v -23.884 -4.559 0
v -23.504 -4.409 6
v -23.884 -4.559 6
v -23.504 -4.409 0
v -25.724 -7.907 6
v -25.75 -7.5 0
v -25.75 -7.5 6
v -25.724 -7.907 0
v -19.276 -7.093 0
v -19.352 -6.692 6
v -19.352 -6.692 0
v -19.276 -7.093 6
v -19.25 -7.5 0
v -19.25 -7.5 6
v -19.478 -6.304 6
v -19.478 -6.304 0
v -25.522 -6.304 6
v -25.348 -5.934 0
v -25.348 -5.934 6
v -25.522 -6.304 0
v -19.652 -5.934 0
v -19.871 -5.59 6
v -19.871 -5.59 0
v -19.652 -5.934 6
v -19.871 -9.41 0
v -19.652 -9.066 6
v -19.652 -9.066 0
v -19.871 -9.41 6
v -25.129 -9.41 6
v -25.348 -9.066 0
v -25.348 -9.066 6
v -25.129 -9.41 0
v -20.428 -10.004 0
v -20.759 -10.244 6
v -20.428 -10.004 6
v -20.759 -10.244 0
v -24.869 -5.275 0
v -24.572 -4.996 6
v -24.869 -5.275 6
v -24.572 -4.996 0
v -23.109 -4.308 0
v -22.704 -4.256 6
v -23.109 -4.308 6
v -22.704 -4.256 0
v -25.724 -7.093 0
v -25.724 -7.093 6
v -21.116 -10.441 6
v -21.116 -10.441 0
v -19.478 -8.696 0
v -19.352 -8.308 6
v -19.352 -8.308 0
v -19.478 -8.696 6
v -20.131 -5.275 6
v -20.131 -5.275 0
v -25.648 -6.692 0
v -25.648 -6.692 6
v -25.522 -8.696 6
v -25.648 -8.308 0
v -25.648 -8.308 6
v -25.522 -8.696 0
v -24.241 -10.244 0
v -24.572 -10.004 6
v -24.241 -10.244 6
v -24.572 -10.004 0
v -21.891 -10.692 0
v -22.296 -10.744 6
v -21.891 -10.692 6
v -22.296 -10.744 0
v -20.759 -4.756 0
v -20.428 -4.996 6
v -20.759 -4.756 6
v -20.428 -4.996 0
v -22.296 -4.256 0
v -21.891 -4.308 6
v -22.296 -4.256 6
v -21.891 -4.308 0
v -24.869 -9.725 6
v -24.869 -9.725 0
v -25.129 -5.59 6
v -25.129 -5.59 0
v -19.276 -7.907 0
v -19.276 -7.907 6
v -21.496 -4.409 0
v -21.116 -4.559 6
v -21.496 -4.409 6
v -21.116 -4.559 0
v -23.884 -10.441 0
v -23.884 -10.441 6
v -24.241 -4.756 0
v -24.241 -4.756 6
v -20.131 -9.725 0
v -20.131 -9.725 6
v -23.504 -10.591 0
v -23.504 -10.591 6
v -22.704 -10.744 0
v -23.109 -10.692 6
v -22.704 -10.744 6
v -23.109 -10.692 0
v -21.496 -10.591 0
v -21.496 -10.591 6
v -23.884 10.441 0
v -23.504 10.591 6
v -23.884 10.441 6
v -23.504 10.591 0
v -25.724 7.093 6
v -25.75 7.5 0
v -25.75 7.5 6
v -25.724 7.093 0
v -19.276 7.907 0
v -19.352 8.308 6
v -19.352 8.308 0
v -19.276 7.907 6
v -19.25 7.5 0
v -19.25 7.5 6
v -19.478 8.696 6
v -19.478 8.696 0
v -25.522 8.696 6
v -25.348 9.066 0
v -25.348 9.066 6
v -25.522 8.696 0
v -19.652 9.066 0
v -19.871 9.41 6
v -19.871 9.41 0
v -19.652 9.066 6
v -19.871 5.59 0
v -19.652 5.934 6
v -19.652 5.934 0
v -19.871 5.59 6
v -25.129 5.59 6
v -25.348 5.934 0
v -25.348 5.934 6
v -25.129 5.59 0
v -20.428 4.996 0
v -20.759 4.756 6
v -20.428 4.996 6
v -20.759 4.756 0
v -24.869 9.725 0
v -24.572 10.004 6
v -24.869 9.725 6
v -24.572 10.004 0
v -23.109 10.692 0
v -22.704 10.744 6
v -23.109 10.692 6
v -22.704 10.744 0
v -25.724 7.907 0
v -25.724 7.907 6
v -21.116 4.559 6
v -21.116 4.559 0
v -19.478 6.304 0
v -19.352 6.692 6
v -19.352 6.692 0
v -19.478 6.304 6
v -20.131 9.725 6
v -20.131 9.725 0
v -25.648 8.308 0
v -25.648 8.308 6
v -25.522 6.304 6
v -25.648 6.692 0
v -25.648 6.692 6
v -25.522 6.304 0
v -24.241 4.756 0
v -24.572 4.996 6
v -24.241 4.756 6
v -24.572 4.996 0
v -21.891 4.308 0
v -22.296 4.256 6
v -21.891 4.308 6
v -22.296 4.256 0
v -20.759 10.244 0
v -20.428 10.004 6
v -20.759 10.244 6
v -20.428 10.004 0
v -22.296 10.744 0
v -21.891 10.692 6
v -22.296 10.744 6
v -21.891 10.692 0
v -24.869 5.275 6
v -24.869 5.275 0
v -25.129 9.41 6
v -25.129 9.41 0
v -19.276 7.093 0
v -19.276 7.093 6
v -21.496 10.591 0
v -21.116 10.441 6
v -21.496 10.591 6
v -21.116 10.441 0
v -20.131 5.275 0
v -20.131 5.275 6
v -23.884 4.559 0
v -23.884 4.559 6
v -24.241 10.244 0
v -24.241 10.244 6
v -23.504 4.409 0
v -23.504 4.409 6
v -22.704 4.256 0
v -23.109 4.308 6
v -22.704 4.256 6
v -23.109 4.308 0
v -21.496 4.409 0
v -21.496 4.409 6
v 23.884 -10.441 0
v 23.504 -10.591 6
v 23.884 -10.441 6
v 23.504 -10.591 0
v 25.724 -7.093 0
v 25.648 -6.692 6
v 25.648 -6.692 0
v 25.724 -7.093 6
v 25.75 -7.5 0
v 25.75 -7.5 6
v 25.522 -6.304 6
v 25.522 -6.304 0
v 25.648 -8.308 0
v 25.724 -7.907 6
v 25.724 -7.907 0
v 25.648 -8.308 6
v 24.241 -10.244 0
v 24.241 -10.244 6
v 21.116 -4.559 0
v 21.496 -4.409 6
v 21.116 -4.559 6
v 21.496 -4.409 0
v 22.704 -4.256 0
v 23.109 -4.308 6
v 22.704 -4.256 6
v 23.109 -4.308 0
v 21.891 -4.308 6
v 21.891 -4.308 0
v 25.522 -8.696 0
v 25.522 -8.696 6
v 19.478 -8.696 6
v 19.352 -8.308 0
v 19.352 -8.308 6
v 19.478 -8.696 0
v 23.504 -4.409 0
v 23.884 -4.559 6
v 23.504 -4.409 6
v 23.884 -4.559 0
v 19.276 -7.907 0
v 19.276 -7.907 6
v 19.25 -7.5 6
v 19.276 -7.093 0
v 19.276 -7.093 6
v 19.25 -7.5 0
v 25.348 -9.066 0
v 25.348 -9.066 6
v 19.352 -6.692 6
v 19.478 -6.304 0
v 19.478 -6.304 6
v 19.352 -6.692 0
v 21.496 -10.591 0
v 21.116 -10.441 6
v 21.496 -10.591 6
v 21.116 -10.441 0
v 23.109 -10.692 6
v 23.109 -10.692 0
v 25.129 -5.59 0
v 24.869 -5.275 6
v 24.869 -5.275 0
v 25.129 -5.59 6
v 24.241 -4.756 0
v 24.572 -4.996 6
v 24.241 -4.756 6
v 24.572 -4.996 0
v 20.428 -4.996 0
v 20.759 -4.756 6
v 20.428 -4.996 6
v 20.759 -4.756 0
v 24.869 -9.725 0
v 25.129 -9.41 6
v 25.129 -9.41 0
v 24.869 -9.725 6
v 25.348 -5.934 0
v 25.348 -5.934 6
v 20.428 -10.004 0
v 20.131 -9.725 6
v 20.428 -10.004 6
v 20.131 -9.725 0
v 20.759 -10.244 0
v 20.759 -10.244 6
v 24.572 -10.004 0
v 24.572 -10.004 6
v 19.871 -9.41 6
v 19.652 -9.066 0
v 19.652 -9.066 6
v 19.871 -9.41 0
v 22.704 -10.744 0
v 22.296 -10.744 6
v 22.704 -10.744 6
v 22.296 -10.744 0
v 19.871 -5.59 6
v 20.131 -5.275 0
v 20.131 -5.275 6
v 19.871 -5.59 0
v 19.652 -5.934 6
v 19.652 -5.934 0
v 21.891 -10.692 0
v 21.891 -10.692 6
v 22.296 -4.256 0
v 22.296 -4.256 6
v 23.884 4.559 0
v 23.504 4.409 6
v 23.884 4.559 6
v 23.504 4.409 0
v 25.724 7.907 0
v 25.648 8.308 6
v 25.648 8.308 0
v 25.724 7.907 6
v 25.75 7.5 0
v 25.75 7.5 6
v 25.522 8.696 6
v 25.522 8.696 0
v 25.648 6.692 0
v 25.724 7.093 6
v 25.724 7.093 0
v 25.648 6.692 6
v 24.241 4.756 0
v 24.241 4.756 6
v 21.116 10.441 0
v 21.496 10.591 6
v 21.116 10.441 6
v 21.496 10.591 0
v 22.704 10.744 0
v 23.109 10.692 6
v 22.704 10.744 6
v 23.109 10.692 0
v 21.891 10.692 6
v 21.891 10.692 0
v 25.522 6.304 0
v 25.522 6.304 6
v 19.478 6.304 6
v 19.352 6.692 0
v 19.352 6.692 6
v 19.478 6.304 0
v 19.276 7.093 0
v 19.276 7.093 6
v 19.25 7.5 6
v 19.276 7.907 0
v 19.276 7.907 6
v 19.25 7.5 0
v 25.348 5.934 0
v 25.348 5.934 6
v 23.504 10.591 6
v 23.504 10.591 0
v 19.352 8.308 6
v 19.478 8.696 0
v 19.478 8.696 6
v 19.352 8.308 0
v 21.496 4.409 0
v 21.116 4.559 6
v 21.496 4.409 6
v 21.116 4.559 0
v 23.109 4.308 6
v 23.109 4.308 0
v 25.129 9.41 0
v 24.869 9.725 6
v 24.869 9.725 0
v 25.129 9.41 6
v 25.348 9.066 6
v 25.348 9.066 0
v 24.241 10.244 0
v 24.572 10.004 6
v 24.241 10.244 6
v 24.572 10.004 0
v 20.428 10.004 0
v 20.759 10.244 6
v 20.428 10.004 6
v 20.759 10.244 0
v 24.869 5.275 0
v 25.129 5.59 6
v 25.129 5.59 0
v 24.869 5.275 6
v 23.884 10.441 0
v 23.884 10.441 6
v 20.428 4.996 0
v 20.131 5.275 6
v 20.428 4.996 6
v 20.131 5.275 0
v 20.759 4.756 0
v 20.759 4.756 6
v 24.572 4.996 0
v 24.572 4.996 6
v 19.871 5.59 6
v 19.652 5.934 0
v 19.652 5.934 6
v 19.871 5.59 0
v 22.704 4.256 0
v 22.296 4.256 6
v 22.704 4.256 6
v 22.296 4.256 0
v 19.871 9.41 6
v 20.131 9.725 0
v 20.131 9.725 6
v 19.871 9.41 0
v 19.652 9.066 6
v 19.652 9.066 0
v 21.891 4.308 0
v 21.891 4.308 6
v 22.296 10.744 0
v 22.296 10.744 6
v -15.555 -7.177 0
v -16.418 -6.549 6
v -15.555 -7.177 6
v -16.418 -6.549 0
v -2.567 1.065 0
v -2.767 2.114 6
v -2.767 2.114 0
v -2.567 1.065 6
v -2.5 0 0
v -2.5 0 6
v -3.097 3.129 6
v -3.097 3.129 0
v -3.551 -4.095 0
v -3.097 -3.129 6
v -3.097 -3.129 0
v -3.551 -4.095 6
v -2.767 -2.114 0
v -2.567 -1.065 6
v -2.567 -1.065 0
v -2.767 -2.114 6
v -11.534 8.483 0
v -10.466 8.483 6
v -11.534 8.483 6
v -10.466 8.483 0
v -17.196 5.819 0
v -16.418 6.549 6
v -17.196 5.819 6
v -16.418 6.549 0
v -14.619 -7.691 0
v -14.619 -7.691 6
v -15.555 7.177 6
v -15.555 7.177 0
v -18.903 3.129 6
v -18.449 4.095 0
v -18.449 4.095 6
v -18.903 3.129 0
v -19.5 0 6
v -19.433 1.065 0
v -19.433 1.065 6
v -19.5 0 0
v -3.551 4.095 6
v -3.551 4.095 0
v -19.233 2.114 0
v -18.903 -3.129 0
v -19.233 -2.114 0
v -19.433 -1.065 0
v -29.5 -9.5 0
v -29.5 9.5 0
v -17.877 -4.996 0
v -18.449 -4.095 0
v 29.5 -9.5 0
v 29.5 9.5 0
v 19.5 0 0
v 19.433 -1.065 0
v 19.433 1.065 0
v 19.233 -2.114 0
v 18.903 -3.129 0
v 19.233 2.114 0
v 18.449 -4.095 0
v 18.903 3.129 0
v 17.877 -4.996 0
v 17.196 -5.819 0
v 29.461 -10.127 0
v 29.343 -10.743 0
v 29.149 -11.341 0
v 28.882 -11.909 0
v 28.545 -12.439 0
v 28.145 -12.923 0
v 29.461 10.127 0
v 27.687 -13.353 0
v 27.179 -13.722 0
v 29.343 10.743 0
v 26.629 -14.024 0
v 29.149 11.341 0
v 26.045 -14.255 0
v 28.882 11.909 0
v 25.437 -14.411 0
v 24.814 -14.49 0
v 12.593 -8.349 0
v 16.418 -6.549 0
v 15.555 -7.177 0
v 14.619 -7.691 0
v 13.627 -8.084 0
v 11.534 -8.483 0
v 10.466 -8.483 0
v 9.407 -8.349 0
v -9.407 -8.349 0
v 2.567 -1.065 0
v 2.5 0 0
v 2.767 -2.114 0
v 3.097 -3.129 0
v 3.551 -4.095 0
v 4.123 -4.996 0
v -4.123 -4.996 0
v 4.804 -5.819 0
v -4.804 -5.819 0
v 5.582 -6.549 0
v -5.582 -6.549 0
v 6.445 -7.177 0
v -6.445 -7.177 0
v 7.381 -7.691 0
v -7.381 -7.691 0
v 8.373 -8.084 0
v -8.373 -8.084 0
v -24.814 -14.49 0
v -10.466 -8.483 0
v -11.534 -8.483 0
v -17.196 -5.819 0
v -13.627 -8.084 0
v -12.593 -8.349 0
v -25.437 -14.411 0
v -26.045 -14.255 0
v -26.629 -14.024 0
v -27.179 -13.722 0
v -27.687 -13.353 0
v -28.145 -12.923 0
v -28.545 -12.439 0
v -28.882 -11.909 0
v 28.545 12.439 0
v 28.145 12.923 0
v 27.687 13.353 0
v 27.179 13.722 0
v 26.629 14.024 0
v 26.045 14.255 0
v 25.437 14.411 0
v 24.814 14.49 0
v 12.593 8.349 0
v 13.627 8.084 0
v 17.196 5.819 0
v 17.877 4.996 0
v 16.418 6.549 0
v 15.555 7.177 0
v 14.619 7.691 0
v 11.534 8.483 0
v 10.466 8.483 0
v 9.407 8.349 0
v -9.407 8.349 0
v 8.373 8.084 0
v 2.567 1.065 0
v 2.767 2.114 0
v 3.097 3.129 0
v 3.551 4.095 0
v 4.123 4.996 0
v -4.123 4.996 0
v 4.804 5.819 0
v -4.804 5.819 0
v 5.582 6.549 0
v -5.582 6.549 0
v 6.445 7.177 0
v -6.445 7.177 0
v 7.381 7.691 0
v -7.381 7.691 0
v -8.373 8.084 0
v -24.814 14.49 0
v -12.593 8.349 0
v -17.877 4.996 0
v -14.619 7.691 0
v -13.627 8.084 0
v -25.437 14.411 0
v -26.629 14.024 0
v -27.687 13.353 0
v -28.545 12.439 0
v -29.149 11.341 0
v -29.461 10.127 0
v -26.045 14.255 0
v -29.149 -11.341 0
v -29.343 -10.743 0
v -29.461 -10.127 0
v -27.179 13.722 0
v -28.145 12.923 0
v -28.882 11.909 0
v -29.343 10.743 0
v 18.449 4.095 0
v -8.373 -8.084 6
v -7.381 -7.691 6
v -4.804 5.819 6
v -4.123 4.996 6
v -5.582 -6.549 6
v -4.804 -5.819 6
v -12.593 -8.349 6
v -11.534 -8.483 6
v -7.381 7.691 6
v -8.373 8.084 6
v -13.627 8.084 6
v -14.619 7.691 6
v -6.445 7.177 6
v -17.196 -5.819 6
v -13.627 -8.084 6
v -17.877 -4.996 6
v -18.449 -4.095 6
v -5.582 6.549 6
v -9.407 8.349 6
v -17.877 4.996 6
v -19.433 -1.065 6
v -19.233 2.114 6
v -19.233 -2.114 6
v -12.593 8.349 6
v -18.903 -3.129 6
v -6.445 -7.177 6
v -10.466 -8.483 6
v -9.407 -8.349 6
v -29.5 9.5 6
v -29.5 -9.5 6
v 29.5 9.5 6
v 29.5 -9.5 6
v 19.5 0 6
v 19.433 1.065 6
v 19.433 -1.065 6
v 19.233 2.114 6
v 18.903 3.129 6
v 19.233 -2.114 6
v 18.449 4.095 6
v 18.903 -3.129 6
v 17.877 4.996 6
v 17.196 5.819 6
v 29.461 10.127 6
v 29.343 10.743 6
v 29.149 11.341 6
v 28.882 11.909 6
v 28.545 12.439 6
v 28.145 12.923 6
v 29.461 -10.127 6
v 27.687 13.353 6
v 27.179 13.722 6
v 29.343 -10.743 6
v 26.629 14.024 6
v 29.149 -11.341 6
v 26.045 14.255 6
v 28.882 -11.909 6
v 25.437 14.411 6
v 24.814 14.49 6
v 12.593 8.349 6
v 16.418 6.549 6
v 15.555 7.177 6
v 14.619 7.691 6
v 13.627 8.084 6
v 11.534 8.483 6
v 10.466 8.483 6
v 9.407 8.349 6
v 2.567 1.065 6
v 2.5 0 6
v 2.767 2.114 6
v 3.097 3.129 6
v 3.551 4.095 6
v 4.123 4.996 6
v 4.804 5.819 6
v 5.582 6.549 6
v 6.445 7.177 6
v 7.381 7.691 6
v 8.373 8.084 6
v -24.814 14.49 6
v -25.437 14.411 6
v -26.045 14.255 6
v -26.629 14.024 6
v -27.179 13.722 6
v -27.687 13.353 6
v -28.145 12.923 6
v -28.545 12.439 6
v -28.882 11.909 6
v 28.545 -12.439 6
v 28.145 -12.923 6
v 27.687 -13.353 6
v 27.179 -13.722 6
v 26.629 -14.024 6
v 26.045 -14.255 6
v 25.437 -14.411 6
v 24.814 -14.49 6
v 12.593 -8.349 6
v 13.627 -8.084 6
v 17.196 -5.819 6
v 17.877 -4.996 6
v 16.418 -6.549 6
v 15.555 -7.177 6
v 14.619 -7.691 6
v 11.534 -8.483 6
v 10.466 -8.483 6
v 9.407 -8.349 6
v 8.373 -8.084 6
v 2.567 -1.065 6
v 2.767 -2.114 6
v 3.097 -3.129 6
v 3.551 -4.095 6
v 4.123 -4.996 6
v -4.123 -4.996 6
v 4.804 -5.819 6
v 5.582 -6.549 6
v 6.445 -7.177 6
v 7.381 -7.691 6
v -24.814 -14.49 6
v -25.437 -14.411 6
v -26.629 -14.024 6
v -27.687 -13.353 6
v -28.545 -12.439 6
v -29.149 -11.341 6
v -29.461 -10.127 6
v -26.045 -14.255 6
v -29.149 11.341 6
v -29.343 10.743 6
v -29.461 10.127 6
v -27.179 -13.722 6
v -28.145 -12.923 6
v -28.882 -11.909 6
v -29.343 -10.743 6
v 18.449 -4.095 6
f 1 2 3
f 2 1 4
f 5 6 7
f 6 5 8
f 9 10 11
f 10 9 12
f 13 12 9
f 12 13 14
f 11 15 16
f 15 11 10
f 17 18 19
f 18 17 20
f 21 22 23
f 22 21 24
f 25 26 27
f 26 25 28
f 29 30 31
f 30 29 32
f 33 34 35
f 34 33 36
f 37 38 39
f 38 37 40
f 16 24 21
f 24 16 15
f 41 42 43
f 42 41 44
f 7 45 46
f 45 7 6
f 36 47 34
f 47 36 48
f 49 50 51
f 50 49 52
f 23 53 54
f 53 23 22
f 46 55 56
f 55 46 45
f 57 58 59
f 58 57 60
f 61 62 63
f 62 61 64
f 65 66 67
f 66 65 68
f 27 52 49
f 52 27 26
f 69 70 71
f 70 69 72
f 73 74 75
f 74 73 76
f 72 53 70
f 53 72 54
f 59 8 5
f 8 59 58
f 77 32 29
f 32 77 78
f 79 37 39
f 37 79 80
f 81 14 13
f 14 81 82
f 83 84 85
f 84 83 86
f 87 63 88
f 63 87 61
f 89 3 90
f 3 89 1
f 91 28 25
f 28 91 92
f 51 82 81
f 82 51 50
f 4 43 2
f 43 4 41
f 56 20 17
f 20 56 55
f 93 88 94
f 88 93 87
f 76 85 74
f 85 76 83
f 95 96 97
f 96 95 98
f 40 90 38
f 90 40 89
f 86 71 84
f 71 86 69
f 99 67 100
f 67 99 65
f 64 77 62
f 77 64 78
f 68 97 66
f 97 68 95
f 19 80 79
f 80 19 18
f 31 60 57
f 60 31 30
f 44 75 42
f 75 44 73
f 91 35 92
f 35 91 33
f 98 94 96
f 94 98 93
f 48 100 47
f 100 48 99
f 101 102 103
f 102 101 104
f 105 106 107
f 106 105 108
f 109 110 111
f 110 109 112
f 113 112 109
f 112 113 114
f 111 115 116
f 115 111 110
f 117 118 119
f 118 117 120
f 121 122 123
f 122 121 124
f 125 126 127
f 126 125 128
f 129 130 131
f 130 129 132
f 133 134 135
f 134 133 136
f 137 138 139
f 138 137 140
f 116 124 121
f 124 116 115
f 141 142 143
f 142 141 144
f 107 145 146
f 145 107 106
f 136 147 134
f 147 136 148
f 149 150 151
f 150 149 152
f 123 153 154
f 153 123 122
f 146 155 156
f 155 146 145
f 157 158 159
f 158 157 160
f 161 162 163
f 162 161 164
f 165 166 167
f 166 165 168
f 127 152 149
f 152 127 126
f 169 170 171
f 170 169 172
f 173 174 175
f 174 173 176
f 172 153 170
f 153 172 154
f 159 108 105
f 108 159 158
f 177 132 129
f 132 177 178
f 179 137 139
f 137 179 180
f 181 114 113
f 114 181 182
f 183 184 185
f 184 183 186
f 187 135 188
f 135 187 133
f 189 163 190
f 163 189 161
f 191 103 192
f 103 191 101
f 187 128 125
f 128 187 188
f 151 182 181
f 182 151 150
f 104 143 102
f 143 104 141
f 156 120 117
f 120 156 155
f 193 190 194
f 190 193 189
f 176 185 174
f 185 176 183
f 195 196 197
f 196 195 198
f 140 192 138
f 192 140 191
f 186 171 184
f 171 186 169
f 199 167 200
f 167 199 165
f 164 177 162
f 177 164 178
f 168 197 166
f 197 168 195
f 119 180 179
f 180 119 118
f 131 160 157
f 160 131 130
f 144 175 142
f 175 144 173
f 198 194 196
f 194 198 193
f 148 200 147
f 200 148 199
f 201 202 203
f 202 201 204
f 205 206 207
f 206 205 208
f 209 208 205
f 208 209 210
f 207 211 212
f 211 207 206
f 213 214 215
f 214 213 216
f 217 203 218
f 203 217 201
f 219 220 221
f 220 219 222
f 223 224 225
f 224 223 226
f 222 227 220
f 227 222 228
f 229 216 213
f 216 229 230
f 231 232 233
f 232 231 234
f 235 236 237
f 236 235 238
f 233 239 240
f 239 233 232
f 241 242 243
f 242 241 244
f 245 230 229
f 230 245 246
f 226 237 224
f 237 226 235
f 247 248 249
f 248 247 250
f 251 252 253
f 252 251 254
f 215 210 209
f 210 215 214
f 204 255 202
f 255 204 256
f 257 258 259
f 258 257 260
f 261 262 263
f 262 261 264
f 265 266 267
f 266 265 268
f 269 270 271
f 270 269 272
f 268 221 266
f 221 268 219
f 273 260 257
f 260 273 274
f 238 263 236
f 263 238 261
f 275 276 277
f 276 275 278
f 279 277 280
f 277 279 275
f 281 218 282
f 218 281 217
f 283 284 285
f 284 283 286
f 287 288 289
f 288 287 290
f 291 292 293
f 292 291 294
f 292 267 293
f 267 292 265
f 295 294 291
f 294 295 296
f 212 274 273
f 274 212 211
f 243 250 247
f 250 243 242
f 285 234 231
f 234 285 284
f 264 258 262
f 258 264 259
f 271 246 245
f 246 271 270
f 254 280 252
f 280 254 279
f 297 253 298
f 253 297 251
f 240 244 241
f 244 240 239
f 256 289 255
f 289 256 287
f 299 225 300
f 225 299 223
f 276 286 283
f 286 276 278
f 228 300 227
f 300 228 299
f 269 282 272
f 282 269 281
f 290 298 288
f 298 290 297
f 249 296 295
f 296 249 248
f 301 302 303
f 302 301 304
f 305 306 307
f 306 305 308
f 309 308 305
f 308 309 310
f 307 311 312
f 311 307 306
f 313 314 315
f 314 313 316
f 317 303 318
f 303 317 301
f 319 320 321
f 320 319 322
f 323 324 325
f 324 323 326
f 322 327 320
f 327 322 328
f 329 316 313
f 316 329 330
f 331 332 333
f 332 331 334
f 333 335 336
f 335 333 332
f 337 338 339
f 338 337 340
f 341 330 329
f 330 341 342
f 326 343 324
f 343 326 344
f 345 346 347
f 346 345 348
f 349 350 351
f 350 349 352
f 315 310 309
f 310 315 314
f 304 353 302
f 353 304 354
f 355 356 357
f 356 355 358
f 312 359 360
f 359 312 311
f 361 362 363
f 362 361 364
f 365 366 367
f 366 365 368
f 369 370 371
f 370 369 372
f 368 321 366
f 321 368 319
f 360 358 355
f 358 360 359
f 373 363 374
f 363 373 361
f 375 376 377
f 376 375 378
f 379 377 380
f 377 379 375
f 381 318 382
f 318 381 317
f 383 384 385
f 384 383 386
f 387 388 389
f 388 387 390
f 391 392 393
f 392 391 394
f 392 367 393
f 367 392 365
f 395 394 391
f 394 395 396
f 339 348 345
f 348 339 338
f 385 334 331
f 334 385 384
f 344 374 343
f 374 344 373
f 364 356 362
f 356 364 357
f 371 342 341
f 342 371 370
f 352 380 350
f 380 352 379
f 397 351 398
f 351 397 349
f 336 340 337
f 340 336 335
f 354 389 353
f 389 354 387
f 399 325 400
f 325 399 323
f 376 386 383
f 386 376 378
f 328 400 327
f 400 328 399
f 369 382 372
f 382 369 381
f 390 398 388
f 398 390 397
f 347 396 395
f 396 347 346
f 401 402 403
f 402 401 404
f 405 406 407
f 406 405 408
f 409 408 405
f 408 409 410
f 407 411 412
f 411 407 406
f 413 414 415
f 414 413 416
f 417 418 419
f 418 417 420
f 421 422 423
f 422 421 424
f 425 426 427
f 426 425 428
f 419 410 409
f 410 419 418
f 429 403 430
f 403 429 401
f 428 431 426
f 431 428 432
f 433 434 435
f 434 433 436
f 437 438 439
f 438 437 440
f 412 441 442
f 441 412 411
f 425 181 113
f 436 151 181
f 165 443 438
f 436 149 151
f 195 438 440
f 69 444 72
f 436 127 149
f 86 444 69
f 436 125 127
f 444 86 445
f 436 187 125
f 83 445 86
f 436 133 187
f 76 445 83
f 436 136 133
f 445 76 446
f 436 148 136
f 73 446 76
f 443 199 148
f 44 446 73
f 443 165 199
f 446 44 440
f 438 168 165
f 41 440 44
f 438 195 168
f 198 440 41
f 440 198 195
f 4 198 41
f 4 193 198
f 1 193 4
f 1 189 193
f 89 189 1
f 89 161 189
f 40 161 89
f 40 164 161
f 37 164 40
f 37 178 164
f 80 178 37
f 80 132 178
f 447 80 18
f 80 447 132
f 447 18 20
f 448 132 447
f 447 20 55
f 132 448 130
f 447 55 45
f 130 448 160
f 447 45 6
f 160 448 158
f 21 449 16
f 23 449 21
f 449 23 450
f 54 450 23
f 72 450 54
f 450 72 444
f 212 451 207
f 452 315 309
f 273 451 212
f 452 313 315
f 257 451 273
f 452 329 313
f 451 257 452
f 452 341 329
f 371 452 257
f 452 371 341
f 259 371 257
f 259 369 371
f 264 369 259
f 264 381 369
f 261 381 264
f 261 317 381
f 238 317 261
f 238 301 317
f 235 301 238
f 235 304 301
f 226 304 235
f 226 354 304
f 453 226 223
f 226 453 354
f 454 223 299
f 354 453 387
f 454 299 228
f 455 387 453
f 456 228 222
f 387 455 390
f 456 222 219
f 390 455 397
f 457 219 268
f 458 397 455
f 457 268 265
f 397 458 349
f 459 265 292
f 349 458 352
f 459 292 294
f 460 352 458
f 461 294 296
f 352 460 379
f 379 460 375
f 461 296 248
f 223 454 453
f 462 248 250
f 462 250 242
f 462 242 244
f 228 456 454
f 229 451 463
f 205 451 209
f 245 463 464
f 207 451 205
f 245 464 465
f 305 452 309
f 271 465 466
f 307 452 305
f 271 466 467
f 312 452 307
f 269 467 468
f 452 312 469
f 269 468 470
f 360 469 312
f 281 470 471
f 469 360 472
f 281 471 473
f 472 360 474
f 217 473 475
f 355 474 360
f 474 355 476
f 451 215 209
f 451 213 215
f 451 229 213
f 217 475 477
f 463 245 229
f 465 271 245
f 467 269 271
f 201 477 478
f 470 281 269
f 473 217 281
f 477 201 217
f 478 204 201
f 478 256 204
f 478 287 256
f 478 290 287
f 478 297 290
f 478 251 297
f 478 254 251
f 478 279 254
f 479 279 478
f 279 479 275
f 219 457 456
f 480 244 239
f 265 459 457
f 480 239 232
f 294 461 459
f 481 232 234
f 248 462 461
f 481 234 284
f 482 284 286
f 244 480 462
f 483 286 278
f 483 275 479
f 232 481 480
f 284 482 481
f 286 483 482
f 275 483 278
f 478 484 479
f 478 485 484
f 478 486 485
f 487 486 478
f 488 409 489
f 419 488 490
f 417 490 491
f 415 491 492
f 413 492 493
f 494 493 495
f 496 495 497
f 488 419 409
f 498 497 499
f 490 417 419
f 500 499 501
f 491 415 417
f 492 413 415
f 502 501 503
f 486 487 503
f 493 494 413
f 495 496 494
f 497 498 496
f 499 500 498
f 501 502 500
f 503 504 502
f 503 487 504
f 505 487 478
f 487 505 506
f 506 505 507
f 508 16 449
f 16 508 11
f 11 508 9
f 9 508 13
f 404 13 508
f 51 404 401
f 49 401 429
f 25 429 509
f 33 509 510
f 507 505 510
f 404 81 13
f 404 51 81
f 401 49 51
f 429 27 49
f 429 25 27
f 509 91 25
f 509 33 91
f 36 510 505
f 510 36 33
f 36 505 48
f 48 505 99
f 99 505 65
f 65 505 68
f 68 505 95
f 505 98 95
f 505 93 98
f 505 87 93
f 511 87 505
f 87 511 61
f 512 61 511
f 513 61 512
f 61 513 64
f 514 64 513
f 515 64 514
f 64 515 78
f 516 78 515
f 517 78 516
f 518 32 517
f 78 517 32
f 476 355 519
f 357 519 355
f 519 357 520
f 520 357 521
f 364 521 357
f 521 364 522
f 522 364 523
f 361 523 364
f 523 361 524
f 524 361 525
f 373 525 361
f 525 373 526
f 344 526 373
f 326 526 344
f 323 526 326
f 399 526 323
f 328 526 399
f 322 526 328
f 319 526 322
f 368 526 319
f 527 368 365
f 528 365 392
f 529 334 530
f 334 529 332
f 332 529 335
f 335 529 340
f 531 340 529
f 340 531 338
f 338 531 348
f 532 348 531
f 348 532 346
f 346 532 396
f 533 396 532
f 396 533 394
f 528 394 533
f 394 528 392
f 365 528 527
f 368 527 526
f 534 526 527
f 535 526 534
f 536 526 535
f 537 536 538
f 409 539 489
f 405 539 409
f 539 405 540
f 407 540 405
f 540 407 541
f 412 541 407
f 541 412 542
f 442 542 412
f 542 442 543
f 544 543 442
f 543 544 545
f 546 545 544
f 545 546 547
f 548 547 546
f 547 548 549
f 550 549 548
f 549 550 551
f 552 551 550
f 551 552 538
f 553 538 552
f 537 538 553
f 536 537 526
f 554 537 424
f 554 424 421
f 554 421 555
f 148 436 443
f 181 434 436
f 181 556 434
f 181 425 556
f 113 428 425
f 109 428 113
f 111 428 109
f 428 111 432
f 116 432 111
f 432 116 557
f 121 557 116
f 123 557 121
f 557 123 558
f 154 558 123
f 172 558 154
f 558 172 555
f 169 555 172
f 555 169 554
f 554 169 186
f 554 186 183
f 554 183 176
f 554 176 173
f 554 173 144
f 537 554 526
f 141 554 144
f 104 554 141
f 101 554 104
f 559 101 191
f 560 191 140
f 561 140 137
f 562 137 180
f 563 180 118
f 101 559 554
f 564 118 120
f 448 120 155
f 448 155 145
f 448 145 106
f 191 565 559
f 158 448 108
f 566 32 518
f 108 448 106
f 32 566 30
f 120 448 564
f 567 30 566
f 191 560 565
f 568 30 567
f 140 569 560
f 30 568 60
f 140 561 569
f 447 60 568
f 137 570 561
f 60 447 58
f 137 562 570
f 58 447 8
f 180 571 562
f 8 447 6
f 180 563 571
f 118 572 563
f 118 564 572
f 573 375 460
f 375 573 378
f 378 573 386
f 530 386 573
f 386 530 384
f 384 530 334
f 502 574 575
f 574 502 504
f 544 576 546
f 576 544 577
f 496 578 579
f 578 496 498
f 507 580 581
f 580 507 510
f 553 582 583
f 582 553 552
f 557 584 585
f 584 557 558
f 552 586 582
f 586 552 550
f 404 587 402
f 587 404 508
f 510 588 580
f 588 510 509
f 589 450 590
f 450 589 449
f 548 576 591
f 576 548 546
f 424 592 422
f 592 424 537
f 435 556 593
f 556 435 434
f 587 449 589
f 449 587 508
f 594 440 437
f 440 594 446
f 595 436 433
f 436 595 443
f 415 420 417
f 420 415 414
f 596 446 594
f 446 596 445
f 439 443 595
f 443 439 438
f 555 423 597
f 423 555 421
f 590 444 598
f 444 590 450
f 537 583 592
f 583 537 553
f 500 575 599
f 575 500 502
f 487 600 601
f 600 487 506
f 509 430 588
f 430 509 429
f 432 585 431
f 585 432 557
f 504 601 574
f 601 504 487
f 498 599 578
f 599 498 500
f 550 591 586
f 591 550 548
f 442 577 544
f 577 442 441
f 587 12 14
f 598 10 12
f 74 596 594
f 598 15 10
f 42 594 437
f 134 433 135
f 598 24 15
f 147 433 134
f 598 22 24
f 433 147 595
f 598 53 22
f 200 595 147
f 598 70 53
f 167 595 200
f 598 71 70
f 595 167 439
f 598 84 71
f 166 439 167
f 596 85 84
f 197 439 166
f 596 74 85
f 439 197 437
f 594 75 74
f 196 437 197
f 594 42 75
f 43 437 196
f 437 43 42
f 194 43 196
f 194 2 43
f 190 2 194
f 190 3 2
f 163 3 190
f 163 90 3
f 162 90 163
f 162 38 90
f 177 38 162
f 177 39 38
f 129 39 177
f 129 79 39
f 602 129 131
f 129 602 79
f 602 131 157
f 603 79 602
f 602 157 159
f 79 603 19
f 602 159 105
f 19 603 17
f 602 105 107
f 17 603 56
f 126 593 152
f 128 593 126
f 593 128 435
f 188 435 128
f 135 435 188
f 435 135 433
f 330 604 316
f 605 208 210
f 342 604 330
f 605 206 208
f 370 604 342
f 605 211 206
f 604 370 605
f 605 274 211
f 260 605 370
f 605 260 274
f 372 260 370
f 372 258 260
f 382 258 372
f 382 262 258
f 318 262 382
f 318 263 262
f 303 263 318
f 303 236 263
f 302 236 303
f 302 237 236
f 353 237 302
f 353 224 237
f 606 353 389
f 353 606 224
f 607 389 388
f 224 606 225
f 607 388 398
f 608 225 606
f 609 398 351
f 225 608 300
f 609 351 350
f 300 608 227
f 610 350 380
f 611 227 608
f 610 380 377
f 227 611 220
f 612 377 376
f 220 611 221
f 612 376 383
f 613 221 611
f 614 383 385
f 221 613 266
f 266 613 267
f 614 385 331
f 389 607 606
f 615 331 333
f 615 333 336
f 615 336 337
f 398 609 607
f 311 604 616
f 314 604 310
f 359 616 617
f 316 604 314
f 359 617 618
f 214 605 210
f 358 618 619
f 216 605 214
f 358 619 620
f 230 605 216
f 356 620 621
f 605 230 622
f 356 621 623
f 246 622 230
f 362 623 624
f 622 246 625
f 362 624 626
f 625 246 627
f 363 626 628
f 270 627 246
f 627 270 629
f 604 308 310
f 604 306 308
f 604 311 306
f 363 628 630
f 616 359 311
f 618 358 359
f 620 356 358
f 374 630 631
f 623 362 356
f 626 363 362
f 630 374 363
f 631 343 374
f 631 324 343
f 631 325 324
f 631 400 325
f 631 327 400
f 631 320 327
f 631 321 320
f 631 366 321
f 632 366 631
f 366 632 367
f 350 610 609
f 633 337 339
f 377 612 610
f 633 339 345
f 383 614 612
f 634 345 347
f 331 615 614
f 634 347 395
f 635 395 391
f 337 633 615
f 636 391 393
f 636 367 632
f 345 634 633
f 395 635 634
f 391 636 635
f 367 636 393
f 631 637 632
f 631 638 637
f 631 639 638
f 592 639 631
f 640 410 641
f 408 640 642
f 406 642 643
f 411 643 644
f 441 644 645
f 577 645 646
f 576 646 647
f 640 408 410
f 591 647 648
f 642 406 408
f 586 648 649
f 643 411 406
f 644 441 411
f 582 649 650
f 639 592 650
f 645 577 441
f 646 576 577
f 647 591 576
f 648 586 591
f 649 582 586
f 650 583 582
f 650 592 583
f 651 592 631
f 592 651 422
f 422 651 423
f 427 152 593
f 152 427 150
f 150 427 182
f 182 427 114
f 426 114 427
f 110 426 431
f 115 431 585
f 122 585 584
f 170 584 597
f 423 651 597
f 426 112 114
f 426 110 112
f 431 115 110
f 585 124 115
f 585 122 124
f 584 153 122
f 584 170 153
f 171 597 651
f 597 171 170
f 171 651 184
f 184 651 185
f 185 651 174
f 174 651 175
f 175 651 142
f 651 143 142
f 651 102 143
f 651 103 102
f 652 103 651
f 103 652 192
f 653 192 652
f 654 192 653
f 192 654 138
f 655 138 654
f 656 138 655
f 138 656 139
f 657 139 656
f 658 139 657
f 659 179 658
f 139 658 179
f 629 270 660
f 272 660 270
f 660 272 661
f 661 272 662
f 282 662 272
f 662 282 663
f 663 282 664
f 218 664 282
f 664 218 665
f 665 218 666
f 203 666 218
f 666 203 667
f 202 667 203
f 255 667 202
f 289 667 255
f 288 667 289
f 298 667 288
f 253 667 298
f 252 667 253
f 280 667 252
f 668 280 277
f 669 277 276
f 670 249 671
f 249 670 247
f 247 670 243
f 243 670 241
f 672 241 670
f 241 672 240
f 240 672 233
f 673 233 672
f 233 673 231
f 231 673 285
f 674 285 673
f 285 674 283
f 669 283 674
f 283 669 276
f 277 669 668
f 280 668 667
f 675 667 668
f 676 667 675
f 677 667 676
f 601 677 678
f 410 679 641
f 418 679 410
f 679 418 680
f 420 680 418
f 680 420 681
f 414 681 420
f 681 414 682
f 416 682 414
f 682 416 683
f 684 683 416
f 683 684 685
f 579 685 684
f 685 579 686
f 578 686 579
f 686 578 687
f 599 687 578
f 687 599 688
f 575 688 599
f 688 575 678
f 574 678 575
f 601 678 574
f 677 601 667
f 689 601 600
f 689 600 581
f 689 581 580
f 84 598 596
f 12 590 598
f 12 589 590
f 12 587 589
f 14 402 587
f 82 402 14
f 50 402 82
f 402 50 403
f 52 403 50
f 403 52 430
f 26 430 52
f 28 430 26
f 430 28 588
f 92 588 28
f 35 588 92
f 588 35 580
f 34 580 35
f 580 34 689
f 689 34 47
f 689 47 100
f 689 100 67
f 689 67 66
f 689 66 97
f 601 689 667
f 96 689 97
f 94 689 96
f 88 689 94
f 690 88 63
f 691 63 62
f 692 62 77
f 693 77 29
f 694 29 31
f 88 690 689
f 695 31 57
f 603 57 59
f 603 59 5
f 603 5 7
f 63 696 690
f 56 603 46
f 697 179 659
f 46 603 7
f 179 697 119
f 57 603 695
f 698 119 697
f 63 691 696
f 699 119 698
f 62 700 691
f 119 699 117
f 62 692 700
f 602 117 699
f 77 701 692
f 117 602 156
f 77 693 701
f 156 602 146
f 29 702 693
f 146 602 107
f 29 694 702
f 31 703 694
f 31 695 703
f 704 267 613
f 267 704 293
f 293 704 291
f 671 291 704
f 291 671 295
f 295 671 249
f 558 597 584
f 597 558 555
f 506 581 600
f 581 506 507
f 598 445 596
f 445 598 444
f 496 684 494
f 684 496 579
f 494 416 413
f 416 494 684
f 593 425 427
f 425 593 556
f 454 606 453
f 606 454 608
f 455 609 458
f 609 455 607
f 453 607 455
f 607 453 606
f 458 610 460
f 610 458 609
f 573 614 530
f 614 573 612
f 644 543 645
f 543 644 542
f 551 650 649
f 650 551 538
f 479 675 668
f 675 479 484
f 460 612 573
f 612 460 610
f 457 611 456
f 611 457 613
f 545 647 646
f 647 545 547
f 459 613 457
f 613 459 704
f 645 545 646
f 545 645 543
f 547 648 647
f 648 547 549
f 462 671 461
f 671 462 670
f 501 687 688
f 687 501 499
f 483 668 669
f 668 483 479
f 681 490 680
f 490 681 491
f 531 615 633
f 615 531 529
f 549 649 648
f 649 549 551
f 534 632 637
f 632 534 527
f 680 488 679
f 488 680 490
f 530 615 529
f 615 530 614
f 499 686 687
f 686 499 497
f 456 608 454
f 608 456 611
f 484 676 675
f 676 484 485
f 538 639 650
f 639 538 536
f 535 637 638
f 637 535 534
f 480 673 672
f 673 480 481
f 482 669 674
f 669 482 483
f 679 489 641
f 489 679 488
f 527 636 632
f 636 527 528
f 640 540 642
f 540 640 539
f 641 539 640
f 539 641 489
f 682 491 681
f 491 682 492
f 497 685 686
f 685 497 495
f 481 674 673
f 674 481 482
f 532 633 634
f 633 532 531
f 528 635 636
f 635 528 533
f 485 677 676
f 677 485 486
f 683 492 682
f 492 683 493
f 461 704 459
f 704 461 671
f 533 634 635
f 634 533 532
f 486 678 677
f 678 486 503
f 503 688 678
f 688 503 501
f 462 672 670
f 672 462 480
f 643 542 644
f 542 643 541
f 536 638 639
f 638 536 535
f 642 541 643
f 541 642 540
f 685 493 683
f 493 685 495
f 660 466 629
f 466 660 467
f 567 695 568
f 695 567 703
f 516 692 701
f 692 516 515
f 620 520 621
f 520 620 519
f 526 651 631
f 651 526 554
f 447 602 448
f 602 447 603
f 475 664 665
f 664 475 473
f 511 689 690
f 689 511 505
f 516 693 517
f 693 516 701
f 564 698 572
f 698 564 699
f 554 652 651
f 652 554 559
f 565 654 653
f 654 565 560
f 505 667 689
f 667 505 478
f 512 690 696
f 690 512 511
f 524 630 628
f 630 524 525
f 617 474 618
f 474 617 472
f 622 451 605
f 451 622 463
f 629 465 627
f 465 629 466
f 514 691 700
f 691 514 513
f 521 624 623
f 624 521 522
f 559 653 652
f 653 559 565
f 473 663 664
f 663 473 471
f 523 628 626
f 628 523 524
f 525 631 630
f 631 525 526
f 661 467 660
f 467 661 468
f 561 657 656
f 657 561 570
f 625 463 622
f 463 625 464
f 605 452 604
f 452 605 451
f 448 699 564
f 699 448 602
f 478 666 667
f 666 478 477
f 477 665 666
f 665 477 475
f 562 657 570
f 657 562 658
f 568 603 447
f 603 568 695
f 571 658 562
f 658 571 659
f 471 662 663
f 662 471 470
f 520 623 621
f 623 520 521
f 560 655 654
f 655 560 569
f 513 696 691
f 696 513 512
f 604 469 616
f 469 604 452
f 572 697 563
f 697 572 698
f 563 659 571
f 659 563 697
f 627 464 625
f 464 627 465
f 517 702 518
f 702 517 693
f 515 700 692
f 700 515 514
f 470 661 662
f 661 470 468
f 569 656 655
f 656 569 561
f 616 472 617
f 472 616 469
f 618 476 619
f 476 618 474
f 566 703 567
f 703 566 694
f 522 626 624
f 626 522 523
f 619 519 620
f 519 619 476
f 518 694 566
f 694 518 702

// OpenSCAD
$fn = 50;


difference() {
	union() {
		hull() {
			translate(v = [-24.5000000000, 9.5000000000, 0]) {
				cylinder(h = 6, r = 5);
			}
			translate(v = [24.5000000000, 9.5000000000, 0]) {
				cylinder(h = 6, r = 5);
			}
			translate(v = [-24.5000000000, -9.5000000000, 0]) {
				cylinder(h = 6, r = 5);
			}
			translate(v = [24.5000000000, -9.5000000000, 0]) {
				cylinder(h = 6, r = 5);
			}
		}
	}
	union() {
		#translate(v = [-22.5000000000, -7.5000000000, -100.0000000000]) {
			cylinder(h = 200, r = 3.2500000000);
		}
		#translate(v = [-22.5000000000, 7.5000000000, -100.0000000000]) {
			cylinder(h = 200, r = 3.2500000000);
		}
		#translate(v = [22.5000000000, -7.5000000000, -100.0000000000]) {
			cylinder(h = 200, r = 3.2500000000);
		}
		#translate(v = [22.5000000000, 7.5000000000, -100.0000000000]) {
			cylinder(h = 200, r = 3.2500000000);
		}
		#translate(v = [-11.0000000000, 0, 0]) {
			cylinder(h = 6, r = 8.5000000000);
		}
		#translate(v = [11.0000000000, 0, 0]) {
			cylinder(h = 6, r = 8.5000000000);
		}
	}
}
